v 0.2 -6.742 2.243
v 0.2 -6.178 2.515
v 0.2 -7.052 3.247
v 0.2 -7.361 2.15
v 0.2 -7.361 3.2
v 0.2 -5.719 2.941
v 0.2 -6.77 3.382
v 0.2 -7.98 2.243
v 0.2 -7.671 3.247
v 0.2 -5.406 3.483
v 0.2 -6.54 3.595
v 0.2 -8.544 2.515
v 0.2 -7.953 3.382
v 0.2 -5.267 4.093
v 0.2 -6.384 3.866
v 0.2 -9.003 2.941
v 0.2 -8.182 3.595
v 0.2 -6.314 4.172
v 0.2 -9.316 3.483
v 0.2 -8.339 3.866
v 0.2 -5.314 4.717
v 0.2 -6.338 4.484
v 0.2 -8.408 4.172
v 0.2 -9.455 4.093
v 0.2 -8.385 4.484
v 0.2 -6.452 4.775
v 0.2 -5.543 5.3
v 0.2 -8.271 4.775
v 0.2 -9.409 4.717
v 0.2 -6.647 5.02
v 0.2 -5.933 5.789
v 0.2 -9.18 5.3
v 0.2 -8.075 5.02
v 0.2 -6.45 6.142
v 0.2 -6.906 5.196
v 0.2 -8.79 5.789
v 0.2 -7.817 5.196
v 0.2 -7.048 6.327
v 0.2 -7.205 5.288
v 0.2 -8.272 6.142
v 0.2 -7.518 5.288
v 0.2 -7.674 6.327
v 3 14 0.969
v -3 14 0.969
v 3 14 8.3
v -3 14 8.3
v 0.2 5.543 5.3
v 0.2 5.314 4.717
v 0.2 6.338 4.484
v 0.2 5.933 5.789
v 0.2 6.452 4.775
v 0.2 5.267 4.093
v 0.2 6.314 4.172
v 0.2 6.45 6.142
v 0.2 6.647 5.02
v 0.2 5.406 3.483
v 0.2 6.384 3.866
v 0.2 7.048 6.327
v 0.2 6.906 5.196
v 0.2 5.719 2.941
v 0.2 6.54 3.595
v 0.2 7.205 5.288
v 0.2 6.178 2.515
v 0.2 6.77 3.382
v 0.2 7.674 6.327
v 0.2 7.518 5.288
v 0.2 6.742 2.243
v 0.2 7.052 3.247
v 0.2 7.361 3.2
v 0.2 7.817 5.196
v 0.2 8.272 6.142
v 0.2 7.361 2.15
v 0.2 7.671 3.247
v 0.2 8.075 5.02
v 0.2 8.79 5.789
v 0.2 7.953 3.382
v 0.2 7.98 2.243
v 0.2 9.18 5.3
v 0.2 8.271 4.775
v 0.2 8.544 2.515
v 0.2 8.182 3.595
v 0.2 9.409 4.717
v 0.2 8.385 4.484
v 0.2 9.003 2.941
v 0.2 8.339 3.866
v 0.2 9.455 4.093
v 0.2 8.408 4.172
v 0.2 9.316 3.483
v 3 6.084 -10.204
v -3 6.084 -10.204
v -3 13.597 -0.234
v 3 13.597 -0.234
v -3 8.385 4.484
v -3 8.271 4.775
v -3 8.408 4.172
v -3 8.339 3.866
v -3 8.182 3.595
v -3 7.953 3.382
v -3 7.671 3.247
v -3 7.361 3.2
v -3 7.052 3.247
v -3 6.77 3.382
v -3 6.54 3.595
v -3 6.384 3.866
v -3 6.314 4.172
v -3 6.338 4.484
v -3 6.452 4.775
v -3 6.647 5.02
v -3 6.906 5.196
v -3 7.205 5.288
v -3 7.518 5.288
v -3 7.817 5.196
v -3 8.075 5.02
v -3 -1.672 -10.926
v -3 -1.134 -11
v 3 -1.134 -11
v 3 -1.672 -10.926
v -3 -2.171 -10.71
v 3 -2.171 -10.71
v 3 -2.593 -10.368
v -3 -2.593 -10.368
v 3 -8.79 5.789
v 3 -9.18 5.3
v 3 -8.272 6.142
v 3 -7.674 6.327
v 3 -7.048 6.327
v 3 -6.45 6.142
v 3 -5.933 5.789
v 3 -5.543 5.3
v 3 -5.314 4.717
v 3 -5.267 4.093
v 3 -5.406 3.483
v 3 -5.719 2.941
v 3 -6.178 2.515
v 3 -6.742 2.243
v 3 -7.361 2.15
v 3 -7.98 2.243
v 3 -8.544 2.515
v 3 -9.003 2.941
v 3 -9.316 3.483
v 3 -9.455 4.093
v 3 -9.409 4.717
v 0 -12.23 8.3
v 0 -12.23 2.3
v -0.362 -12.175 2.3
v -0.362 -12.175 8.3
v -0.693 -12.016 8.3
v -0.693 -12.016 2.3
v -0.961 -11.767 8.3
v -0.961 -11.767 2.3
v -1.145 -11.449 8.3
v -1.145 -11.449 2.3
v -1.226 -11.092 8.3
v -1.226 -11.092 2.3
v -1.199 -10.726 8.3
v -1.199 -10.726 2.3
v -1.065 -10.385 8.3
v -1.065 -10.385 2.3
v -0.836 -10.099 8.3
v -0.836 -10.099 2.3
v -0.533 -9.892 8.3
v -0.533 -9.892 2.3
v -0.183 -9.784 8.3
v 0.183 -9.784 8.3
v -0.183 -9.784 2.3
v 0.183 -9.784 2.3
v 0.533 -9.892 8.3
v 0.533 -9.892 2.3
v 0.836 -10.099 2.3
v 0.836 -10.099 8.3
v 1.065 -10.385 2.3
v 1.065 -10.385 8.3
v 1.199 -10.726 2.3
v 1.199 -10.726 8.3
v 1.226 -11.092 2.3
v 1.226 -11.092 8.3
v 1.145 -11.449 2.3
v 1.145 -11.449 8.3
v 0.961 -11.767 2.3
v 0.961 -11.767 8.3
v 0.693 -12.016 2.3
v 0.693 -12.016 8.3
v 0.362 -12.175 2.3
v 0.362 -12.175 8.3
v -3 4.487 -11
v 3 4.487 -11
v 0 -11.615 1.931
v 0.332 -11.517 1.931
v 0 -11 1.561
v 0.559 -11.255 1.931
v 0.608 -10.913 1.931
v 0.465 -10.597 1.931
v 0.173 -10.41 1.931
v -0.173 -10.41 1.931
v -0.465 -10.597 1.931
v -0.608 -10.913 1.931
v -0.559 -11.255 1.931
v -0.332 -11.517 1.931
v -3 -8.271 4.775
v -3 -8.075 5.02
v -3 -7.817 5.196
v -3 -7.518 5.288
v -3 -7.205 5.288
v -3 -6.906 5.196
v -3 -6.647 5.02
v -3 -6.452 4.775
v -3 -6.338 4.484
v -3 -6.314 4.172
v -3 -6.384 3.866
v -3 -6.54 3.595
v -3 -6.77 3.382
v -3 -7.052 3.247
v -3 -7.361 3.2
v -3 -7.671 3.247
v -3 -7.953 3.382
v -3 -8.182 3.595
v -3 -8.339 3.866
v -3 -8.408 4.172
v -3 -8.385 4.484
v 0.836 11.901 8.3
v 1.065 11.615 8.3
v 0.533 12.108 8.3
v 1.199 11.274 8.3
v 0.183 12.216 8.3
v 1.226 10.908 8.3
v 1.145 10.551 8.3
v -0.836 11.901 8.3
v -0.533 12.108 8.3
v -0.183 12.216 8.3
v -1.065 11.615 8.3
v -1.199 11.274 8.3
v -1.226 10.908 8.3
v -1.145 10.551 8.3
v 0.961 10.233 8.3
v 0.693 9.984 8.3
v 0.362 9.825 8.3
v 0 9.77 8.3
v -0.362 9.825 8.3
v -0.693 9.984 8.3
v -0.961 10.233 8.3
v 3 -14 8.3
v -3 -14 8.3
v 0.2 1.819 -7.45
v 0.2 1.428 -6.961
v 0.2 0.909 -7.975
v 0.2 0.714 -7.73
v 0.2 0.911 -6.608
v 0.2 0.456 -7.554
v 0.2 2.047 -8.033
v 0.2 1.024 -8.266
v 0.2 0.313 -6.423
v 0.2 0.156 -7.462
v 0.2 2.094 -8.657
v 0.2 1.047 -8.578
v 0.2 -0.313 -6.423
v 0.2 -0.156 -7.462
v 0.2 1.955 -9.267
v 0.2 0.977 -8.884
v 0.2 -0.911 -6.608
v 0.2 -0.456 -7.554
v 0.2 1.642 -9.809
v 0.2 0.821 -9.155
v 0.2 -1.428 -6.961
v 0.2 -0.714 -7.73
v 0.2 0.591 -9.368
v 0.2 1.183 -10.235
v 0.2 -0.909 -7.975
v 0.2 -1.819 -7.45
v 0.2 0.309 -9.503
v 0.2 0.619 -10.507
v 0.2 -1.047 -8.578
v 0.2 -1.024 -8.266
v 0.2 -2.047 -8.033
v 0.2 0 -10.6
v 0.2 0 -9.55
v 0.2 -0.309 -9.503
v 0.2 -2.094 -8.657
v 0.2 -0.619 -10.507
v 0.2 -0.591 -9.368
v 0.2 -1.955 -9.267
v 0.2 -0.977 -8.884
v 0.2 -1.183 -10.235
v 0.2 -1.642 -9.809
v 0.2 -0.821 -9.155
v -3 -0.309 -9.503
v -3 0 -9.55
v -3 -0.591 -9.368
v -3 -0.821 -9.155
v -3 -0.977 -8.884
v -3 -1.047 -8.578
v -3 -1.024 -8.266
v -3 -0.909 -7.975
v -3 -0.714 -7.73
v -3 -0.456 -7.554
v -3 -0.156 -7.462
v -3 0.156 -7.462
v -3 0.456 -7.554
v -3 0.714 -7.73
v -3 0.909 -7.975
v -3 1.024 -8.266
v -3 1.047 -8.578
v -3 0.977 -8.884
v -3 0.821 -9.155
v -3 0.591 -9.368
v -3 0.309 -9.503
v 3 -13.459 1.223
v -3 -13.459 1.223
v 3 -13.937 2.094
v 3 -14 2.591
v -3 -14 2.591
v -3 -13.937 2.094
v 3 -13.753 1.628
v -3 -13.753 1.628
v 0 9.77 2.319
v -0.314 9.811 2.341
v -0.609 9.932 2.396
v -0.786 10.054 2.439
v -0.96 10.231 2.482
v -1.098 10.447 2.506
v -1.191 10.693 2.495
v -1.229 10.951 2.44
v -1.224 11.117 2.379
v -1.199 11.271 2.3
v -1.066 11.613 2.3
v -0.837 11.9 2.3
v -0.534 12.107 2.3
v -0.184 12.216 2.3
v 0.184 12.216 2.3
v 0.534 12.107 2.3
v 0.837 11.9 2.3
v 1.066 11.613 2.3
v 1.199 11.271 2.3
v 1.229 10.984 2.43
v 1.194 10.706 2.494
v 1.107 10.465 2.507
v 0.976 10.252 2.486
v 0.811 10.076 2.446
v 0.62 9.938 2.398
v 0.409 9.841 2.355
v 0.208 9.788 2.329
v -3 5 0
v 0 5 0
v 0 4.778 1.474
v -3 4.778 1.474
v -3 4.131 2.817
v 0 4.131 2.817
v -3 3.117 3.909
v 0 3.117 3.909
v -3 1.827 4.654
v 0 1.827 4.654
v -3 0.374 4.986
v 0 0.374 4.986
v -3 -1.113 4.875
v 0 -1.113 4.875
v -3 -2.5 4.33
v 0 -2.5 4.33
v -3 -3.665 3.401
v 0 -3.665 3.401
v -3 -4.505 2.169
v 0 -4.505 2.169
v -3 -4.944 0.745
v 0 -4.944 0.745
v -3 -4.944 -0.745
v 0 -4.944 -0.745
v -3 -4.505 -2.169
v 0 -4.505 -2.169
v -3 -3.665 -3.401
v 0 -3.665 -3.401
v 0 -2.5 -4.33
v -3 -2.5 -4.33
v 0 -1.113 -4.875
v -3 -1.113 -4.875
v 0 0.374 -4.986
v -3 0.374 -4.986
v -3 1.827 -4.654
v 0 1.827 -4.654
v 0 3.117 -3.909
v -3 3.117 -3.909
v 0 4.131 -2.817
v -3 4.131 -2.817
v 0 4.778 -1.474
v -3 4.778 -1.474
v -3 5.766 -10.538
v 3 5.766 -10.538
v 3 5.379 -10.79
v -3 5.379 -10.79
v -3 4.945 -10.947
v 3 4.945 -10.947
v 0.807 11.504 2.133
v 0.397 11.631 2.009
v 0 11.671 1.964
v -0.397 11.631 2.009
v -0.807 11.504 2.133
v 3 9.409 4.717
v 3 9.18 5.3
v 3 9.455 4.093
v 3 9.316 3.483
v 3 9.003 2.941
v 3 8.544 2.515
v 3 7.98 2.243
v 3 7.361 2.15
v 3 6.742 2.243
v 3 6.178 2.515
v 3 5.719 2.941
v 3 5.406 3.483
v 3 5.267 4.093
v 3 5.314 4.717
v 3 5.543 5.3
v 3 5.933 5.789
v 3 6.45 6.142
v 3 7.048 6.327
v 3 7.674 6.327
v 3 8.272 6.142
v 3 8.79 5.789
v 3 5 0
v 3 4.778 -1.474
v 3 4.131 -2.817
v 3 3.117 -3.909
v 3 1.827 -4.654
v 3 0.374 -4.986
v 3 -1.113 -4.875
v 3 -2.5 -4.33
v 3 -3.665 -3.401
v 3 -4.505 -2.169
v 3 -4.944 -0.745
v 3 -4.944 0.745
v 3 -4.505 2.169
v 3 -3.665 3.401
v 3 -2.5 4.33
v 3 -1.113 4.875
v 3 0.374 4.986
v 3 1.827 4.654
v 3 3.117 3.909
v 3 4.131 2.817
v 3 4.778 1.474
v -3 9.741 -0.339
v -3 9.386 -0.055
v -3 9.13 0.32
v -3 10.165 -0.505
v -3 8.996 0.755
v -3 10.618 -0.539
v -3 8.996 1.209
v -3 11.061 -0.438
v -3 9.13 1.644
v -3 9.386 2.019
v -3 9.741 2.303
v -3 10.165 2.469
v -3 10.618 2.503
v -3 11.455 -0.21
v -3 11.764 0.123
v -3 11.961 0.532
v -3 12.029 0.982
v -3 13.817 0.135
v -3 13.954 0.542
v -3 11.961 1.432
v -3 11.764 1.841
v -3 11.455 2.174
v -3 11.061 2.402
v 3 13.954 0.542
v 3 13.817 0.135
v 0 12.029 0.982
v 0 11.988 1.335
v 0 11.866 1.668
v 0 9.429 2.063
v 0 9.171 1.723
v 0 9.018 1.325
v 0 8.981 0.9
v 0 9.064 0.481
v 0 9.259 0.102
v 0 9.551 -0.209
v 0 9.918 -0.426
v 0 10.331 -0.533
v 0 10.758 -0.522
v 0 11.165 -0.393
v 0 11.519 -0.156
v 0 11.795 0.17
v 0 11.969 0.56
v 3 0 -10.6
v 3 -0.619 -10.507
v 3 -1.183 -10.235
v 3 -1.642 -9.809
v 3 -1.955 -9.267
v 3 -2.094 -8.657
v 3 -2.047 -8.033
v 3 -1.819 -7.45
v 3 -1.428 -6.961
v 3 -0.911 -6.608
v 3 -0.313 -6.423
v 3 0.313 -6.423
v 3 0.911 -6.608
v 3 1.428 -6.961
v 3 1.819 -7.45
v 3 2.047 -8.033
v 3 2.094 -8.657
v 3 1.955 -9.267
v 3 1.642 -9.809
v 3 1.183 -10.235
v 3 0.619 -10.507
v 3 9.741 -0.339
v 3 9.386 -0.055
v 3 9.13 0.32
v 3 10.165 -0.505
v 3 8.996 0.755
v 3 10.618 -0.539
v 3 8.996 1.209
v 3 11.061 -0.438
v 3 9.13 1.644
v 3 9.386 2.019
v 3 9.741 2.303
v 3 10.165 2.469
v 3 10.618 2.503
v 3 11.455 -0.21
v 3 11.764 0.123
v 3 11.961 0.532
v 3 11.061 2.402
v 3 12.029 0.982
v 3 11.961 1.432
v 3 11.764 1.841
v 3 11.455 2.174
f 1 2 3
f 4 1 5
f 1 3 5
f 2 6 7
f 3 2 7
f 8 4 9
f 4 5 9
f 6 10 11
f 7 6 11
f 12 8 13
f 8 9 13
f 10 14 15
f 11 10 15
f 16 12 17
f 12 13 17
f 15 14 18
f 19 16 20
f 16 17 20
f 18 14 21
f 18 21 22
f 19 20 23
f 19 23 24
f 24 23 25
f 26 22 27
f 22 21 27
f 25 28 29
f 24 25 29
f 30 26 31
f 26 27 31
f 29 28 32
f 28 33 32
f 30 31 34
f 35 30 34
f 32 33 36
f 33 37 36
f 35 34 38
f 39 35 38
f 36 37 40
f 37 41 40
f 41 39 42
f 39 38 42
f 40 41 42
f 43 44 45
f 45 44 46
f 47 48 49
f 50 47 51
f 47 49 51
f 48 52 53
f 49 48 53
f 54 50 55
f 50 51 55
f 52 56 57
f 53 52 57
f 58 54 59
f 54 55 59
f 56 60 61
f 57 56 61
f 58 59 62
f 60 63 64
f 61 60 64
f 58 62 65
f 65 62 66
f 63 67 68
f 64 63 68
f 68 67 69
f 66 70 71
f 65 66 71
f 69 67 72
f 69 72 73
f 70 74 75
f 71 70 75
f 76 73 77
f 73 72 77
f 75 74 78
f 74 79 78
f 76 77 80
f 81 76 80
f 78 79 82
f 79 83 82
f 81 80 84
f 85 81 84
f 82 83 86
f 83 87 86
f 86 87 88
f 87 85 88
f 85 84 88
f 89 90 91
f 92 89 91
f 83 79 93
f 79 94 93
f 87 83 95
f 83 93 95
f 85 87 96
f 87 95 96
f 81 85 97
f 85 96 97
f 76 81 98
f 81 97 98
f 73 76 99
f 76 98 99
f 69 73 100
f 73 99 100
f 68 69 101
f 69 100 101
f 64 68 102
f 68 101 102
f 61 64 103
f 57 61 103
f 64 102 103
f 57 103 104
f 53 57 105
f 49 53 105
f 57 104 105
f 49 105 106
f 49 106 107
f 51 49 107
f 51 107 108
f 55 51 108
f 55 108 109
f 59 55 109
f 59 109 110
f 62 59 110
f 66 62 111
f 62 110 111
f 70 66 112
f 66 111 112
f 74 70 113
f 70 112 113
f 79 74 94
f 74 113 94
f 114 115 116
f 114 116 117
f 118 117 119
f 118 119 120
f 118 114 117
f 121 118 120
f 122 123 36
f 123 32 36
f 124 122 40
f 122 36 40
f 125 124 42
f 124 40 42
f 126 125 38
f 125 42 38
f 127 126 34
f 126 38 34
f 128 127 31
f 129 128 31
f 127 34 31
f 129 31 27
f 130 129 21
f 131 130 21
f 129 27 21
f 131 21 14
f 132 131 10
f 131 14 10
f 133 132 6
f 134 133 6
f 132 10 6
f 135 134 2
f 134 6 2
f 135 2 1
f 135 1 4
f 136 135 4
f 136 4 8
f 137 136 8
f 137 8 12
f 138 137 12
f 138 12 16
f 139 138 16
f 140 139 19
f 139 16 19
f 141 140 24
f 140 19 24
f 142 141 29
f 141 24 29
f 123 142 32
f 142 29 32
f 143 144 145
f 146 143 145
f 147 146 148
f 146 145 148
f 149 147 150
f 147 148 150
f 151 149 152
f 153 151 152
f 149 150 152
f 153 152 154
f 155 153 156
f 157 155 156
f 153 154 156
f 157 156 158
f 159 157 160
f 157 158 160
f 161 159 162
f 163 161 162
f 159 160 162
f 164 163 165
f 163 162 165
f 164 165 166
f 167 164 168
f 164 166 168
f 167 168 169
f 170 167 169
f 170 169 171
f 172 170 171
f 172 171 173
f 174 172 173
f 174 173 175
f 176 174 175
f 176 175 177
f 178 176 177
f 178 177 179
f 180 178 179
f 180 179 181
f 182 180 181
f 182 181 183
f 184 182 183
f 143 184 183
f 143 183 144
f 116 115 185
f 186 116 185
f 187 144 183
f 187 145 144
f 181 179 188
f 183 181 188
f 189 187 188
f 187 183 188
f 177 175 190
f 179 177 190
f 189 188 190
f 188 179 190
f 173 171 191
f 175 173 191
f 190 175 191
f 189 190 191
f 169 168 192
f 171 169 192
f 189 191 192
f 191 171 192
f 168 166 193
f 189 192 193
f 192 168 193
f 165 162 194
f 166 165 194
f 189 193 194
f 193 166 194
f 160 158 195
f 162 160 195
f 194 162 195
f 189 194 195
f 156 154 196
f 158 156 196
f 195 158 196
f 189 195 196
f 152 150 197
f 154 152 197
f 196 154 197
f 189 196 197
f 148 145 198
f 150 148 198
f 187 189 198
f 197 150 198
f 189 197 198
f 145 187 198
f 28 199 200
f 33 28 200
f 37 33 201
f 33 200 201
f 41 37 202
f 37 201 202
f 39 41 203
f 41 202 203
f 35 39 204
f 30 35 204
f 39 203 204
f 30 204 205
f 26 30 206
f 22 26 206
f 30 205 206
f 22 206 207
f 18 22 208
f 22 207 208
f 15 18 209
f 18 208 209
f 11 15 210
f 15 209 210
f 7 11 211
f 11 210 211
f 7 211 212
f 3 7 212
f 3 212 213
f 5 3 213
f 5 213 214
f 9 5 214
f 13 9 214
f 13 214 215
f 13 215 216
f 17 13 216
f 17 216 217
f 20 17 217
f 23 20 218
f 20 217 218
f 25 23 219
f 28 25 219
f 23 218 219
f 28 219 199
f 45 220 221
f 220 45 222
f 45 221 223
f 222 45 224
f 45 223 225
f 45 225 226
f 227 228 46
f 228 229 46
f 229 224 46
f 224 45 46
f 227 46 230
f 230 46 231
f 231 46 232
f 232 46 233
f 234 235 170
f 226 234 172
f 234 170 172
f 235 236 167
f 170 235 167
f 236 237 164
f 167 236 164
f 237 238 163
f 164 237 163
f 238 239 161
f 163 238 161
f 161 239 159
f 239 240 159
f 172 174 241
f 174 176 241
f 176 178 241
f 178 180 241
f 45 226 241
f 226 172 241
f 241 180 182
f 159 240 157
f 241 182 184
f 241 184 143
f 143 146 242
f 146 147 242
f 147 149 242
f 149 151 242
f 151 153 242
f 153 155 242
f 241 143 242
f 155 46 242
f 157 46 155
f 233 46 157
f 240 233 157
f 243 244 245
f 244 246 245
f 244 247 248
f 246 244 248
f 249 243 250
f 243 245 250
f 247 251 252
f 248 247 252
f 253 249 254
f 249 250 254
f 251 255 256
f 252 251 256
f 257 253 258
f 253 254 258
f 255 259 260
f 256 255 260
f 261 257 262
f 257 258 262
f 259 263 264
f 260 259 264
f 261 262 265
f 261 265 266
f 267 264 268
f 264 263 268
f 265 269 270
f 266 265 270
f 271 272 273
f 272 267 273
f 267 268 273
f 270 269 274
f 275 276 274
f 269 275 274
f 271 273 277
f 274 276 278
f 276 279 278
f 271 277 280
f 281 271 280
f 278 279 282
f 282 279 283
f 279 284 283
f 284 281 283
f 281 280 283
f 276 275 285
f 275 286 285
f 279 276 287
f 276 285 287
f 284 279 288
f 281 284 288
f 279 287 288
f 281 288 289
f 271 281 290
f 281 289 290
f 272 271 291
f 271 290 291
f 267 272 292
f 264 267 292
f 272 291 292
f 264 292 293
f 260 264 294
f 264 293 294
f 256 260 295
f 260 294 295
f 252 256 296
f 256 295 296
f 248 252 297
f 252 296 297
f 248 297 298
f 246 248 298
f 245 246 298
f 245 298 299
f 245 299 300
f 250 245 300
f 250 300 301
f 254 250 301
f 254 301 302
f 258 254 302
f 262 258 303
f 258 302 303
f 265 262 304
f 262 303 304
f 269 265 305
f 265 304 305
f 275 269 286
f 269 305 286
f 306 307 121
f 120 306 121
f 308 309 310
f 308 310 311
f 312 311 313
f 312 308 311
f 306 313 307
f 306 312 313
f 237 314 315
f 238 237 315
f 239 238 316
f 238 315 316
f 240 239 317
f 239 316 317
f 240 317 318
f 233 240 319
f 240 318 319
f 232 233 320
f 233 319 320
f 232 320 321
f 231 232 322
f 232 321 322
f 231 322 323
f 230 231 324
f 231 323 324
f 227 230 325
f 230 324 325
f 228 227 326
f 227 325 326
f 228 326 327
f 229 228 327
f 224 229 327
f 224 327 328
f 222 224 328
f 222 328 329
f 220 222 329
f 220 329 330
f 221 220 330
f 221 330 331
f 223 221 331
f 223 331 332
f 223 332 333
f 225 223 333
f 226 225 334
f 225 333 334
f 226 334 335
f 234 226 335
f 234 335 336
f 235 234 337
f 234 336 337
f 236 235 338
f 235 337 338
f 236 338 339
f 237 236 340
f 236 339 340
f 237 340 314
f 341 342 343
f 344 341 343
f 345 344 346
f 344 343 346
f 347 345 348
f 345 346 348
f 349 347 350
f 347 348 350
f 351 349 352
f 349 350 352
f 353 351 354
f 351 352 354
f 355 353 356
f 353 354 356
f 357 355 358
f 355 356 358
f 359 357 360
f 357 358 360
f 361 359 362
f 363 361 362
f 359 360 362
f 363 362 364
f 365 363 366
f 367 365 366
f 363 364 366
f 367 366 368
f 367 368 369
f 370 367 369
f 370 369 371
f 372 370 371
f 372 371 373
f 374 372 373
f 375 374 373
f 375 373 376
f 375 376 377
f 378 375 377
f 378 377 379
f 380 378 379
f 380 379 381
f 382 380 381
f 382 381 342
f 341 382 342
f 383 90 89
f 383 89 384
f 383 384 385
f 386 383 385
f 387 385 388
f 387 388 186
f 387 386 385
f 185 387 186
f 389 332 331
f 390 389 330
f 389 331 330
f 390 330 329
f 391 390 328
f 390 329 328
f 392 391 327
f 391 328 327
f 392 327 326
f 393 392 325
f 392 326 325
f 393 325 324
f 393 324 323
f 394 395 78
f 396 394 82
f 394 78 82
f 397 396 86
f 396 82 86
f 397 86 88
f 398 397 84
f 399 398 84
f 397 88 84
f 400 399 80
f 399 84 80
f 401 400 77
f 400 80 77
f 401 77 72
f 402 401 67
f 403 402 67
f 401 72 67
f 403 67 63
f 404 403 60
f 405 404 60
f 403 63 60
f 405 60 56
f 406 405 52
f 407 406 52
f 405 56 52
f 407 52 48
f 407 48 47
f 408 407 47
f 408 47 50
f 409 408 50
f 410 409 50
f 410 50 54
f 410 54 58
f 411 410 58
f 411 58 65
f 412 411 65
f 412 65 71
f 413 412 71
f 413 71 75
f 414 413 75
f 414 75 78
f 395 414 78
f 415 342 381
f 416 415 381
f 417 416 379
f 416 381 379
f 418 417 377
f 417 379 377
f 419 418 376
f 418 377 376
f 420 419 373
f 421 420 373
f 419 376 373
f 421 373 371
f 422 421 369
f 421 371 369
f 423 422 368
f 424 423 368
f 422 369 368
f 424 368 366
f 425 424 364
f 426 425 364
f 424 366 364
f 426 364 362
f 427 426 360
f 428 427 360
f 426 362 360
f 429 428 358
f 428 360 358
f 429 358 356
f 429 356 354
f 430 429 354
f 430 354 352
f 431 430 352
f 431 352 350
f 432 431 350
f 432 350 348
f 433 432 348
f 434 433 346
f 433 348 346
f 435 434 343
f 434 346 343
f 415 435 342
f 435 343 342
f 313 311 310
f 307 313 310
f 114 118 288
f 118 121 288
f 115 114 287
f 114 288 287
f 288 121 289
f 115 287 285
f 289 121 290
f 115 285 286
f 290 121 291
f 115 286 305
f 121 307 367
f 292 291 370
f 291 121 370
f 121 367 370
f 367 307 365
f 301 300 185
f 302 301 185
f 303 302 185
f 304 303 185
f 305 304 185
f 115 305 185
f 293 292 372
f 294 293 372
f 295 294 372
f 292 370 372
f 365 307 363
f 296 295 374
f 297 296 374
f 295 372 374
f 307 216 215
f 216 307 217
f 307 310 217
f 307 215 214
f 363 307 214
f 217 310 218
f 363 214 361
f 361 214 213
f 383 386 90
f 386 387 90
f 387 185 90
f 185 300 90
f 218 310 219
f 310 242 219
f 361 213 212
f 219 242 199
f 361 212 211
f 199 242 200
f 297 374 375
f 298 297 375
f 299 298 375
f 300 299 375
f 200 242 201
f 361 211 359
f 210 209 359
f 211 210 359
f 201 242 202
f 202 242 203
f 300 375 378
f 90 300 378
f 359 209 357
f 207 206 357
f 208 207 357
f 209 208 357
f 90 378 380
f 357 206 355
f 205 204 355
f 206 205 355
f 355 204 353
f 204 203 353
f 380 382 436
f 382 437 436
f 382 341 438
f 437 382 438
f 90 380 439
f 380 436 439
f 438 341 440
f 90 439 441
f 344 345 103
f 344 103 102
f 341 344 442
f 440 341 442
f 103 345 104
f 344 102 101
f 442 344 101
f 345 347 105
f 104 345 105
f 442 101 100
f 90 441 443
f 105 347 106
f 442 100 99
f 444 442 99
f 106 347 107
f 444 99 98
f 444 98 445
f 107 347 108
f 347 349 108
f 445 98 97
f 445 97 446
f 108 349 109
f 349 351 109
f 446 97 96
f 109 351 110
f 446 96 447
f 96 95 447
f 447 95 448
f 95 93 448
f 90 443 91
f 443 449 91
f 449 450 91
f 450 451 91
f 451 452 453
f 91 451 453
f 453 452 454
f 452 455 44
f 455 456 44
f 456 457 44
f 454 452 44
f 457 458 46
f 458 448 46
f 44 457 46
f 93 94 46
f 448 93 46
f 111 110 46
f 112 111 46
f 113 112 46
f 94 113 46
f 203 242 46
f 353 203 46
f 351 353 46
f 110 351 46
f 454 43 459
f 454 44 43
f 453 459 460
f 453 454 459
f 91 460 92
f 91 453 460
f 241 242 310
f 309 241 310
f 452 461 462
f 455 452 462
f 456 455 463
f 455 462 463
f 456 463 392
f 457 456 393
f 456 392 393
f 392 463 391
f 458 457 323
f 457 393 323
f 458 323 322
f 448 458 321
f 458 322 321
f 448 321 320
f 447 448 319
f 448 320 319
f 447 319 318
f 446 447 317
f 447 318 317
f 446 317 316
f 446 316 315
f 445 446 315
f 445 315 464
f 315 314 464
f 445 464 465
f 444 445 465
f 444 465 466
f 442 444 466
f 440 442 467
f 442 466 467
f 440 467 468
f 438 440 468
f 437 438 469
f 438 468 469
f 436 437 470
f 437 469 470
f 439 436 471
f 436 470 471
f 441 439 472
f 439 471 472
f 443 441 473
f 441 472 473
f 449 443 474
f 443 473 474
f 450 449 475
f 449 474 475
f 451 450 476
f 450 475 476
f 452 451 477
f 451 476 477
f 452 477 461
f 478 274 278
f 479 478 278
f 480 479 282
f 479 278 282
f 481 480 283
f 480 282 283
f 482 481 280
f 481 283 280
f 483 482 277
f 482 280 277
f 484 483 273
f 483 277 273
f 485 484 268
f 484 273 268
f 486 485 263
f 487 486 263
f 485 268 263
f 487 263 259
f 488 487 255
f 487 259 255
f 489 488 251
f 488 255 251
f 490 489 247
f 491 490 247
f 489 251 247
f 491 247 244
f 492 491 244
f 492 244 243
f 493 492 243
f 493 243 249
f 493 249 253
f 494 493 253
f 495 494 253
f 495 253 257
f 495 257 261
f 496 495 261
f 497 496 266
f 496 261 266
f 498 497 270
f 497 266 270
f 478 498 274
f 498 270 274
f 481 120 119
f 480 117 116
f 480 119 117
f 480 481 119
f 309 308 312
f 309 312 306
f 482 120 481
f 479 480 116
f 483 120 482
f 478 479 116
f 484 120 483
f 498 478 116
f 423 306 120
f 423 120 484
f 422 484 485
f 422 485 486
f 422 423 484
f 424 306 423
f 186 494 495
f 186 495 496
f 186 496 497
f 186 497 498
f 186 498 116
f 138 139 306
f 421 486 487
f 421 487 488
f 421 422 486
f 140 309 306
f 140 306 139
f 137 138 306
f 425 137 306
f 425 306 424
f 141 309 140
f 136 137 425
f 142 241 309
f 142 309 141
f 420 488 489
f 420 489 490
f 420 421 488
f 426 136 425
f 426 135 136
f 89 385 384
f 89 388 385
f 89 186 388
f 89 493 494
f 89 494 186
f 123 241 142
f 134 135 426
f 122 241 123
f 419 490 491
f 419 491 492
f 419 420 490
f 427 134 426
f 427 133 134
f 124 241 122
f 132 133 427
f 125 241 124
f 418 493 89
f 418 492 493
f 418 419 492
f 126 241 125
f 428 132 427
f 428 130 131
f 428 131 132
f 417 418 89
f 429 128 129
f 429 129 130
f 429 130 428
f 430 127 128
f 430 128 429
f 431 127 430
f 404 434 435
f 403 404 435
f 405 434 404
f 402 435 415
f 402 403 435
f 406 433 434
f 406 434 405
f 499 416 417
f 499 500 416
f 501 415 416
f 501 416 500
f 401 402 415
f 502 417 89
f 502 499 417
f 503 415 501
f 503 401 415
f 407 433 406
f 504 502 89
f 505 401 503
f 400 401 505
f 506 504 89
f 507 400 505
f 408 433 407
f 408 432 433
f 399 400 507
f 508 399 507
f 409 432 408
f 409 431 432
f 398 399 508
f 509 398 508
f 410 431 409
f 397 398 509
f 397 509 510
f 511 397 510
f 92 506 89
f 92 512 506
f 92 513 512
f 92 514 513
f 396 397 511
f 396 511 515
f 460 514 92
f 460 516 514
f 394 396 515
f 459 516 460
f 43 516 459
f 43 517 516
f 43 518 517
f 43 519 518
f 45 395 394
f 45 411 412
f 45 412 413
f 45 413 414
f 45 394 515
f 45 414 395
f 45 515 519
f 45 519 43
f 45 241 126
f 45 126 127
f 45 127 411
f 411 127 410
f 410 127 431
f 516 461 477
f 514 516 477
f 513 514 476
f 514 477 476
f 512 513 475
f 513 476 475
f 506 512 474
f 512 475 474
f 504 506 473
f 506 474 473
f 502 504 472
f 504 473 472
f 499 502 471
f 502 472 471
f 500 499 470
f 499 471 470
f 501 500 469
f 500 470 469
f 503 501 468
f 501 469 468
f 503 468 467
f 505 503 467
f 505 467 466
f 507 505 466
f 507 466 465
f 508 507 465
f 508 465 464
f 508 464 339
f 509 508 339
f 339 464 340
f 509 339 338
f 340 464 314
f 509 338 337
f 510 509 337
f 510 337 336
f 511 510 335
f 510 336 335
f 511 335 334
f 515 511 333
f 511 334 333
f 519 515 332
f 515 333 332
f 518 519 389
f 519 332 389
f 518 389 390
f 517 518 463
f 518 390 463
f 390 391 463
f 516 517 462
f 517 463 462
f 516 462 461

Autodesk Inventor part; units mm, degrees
ref_plane "YZ Plane" through (0, 0, 0) normal (1, 0, 0) x (0, 1, 0)
ref_plane "XZ Plane" through (0, 0, 0) normal (0, 1, 0) x (-1, 0, 0)
ref_plane "XY Plane" through (0, 0, 0) normal (0, 0, 1) x (1, 0, 0)
sketch "Skizze1" plane through (0, 0, 0) normal (1, 0, 0) x (0, 1, 0)
  arc A0 (-7.2187, 8.3) -> (7.2187, 8.3) centre (0, 0) ccw construction
  line L0 (14, 8.3) -> (-14, 8.3)
  line L1 (-14, 8.3) -> (-14, 1.8)
  line L2 (0, 12.16) -> (0, -14.86) projected
  circle A1 centre (0, 0) radius 5
  line L3 (14, 0.3) -> (14, 8.3)
  line L4 (-14, 1.8) -> (-2, -11)
  line L5 (-2, -11) -> (5.4841, -11)
  line L6 (5.4841, -11) -> (14, 0.3)
  circle A2 centre (10.504, 0.982) radius 1.525
  dimension "d0" = 22
  dimension "d2" = 10
  dimension "d19" = 8.3
  dimension "d39" = 14
  dimension "d50" = 3.05
  dimension "d57" = 10.504
  dimension "d61" = 2
  dimension "d62" = 6.5
  dimension "d63" = 8
  dimension "d86" = 10.5498
  dimension "d87" = 7.318
  dimension "d88" = 0.982
extrude "Extrusion1" add sketch "Skizze1" along normal mid plane 6 contours L3 L6 L5 L2 A1 L0 | L2 A1 L5 L4 L1 L0
sketch "Skizze2" plane through (3, 0, 0) normal (1, 0, 0) x (0, 0, -1)
  circle A0 centre (0, 0) radius 8.5 construction
  line L0 (0, 0) -> (8.5, 0) construction
  line L1 (-12.4, 0) -> (14.9, 0) projected
  dimension "d6" = 17
hole "Bohrung1" at (3, 0, -8.5) direction (-1, 0, 0) diameter 2.1 end through all counterbore diameter 4.2 counterbore depth 2.8
pattern_circular "Runde Anordnung1" count 3 over 360 about axis through (0, 0, 0) along (1, 0, 0) of "Bohrung1"
sketch "Skizze3" plane through (-3, -14, 8.3) normal (0, 0, 1) x (1, 0, 0)
  line L0 (0, 0) -> (6, 0) projected
  line L1 (6, 28) -> (6, 0) projected
  line L2 (0, 0) -> (0, 28) projected
  line L3 (0, 0) -> (6, 0) construction
  line L4 (3, 0) -> (3, 24.0467) construction
  line L5 (6, 28) -> (0, 28) projected
  line L6 (-1.2, 14) -> (7.2, 14) projected
  point P0 (3, 14)
  point P1 (3, 3)
  point P2 (3, 25)
  dimension "d44" = 11
hole "Bohrung2" at (0, -11, 8.3) at (0, 11, 8.3) direction (0, 0, -1) diameter 2.459 depth 6 tip angle 118 thread size "M3x0.5" class "6H" standard "ISO Metric profile"
fillet "Rundung2" radius 2 4 edges at (0, -2, -11) (0, 5.4841, -11) (0, -14, 1.8) (0, 14, 0.3)
sketch "Skizze7" plane through (-3, -14, 8.3) normal (0, 0, 1) x (1, 0, 0)
  line L0 (3, 33.6) -> (3, -5.6) construction
  line L1 (-1.2, 14) -> (7.2, 14) construction
  point P0 (3, 14)
  point P1 (3, 10)
  point P2 (3, 18)
  dimension "d78" = 8
hole "Bohrung4" [suppressed]
sketch "Skizze6" plane through (3, 0, 0) normal (1, 0, 0) x (0, 0, -1)
  circle A0 centre (0.5, -7.5) radius 1.5
  circle A1 centre (0.5, -7.5) radius 3 construction
  circle A2 centre (-0.982, 10.504) radius 1.525 construction
  circle A3 centre (-0.982, 10.504) radius 2.75 construction
  circle A4 centre (3, 7.5) radius 3 construction
  circle A5 centre (3, 7.5) radius 1.5
  line L0 (-1.223, -13.4591) -> (10.3679, -2.5926) construction
  line L1 (10.2037, 6.0842) -> (0.2345, 13.5972) construction
  circle A6 centre (-4.25, -7.3612) radius 2.1 construction
  circle A7 centre (0, 0) radius 5 construction
  dimension "d64" = 3
  dimension "d65" = 6
  dimension "d66" = 5.5
  dimension "d67" = 6
  dimension "d68" = 3
  dimension "d69" = 1.152
  dimension "d70" = 1.963
  dimension "d71" = 7.5
  dimension "d72" = 0.5
  dimension "d73" = 7.5
  dimension "d74" = 3
  dimension "d75" = 1.0167
extrude "Fräshalterung Schrauben" [suppressed]
properties part number "Motorhalter" material "Aluminium 6061"
